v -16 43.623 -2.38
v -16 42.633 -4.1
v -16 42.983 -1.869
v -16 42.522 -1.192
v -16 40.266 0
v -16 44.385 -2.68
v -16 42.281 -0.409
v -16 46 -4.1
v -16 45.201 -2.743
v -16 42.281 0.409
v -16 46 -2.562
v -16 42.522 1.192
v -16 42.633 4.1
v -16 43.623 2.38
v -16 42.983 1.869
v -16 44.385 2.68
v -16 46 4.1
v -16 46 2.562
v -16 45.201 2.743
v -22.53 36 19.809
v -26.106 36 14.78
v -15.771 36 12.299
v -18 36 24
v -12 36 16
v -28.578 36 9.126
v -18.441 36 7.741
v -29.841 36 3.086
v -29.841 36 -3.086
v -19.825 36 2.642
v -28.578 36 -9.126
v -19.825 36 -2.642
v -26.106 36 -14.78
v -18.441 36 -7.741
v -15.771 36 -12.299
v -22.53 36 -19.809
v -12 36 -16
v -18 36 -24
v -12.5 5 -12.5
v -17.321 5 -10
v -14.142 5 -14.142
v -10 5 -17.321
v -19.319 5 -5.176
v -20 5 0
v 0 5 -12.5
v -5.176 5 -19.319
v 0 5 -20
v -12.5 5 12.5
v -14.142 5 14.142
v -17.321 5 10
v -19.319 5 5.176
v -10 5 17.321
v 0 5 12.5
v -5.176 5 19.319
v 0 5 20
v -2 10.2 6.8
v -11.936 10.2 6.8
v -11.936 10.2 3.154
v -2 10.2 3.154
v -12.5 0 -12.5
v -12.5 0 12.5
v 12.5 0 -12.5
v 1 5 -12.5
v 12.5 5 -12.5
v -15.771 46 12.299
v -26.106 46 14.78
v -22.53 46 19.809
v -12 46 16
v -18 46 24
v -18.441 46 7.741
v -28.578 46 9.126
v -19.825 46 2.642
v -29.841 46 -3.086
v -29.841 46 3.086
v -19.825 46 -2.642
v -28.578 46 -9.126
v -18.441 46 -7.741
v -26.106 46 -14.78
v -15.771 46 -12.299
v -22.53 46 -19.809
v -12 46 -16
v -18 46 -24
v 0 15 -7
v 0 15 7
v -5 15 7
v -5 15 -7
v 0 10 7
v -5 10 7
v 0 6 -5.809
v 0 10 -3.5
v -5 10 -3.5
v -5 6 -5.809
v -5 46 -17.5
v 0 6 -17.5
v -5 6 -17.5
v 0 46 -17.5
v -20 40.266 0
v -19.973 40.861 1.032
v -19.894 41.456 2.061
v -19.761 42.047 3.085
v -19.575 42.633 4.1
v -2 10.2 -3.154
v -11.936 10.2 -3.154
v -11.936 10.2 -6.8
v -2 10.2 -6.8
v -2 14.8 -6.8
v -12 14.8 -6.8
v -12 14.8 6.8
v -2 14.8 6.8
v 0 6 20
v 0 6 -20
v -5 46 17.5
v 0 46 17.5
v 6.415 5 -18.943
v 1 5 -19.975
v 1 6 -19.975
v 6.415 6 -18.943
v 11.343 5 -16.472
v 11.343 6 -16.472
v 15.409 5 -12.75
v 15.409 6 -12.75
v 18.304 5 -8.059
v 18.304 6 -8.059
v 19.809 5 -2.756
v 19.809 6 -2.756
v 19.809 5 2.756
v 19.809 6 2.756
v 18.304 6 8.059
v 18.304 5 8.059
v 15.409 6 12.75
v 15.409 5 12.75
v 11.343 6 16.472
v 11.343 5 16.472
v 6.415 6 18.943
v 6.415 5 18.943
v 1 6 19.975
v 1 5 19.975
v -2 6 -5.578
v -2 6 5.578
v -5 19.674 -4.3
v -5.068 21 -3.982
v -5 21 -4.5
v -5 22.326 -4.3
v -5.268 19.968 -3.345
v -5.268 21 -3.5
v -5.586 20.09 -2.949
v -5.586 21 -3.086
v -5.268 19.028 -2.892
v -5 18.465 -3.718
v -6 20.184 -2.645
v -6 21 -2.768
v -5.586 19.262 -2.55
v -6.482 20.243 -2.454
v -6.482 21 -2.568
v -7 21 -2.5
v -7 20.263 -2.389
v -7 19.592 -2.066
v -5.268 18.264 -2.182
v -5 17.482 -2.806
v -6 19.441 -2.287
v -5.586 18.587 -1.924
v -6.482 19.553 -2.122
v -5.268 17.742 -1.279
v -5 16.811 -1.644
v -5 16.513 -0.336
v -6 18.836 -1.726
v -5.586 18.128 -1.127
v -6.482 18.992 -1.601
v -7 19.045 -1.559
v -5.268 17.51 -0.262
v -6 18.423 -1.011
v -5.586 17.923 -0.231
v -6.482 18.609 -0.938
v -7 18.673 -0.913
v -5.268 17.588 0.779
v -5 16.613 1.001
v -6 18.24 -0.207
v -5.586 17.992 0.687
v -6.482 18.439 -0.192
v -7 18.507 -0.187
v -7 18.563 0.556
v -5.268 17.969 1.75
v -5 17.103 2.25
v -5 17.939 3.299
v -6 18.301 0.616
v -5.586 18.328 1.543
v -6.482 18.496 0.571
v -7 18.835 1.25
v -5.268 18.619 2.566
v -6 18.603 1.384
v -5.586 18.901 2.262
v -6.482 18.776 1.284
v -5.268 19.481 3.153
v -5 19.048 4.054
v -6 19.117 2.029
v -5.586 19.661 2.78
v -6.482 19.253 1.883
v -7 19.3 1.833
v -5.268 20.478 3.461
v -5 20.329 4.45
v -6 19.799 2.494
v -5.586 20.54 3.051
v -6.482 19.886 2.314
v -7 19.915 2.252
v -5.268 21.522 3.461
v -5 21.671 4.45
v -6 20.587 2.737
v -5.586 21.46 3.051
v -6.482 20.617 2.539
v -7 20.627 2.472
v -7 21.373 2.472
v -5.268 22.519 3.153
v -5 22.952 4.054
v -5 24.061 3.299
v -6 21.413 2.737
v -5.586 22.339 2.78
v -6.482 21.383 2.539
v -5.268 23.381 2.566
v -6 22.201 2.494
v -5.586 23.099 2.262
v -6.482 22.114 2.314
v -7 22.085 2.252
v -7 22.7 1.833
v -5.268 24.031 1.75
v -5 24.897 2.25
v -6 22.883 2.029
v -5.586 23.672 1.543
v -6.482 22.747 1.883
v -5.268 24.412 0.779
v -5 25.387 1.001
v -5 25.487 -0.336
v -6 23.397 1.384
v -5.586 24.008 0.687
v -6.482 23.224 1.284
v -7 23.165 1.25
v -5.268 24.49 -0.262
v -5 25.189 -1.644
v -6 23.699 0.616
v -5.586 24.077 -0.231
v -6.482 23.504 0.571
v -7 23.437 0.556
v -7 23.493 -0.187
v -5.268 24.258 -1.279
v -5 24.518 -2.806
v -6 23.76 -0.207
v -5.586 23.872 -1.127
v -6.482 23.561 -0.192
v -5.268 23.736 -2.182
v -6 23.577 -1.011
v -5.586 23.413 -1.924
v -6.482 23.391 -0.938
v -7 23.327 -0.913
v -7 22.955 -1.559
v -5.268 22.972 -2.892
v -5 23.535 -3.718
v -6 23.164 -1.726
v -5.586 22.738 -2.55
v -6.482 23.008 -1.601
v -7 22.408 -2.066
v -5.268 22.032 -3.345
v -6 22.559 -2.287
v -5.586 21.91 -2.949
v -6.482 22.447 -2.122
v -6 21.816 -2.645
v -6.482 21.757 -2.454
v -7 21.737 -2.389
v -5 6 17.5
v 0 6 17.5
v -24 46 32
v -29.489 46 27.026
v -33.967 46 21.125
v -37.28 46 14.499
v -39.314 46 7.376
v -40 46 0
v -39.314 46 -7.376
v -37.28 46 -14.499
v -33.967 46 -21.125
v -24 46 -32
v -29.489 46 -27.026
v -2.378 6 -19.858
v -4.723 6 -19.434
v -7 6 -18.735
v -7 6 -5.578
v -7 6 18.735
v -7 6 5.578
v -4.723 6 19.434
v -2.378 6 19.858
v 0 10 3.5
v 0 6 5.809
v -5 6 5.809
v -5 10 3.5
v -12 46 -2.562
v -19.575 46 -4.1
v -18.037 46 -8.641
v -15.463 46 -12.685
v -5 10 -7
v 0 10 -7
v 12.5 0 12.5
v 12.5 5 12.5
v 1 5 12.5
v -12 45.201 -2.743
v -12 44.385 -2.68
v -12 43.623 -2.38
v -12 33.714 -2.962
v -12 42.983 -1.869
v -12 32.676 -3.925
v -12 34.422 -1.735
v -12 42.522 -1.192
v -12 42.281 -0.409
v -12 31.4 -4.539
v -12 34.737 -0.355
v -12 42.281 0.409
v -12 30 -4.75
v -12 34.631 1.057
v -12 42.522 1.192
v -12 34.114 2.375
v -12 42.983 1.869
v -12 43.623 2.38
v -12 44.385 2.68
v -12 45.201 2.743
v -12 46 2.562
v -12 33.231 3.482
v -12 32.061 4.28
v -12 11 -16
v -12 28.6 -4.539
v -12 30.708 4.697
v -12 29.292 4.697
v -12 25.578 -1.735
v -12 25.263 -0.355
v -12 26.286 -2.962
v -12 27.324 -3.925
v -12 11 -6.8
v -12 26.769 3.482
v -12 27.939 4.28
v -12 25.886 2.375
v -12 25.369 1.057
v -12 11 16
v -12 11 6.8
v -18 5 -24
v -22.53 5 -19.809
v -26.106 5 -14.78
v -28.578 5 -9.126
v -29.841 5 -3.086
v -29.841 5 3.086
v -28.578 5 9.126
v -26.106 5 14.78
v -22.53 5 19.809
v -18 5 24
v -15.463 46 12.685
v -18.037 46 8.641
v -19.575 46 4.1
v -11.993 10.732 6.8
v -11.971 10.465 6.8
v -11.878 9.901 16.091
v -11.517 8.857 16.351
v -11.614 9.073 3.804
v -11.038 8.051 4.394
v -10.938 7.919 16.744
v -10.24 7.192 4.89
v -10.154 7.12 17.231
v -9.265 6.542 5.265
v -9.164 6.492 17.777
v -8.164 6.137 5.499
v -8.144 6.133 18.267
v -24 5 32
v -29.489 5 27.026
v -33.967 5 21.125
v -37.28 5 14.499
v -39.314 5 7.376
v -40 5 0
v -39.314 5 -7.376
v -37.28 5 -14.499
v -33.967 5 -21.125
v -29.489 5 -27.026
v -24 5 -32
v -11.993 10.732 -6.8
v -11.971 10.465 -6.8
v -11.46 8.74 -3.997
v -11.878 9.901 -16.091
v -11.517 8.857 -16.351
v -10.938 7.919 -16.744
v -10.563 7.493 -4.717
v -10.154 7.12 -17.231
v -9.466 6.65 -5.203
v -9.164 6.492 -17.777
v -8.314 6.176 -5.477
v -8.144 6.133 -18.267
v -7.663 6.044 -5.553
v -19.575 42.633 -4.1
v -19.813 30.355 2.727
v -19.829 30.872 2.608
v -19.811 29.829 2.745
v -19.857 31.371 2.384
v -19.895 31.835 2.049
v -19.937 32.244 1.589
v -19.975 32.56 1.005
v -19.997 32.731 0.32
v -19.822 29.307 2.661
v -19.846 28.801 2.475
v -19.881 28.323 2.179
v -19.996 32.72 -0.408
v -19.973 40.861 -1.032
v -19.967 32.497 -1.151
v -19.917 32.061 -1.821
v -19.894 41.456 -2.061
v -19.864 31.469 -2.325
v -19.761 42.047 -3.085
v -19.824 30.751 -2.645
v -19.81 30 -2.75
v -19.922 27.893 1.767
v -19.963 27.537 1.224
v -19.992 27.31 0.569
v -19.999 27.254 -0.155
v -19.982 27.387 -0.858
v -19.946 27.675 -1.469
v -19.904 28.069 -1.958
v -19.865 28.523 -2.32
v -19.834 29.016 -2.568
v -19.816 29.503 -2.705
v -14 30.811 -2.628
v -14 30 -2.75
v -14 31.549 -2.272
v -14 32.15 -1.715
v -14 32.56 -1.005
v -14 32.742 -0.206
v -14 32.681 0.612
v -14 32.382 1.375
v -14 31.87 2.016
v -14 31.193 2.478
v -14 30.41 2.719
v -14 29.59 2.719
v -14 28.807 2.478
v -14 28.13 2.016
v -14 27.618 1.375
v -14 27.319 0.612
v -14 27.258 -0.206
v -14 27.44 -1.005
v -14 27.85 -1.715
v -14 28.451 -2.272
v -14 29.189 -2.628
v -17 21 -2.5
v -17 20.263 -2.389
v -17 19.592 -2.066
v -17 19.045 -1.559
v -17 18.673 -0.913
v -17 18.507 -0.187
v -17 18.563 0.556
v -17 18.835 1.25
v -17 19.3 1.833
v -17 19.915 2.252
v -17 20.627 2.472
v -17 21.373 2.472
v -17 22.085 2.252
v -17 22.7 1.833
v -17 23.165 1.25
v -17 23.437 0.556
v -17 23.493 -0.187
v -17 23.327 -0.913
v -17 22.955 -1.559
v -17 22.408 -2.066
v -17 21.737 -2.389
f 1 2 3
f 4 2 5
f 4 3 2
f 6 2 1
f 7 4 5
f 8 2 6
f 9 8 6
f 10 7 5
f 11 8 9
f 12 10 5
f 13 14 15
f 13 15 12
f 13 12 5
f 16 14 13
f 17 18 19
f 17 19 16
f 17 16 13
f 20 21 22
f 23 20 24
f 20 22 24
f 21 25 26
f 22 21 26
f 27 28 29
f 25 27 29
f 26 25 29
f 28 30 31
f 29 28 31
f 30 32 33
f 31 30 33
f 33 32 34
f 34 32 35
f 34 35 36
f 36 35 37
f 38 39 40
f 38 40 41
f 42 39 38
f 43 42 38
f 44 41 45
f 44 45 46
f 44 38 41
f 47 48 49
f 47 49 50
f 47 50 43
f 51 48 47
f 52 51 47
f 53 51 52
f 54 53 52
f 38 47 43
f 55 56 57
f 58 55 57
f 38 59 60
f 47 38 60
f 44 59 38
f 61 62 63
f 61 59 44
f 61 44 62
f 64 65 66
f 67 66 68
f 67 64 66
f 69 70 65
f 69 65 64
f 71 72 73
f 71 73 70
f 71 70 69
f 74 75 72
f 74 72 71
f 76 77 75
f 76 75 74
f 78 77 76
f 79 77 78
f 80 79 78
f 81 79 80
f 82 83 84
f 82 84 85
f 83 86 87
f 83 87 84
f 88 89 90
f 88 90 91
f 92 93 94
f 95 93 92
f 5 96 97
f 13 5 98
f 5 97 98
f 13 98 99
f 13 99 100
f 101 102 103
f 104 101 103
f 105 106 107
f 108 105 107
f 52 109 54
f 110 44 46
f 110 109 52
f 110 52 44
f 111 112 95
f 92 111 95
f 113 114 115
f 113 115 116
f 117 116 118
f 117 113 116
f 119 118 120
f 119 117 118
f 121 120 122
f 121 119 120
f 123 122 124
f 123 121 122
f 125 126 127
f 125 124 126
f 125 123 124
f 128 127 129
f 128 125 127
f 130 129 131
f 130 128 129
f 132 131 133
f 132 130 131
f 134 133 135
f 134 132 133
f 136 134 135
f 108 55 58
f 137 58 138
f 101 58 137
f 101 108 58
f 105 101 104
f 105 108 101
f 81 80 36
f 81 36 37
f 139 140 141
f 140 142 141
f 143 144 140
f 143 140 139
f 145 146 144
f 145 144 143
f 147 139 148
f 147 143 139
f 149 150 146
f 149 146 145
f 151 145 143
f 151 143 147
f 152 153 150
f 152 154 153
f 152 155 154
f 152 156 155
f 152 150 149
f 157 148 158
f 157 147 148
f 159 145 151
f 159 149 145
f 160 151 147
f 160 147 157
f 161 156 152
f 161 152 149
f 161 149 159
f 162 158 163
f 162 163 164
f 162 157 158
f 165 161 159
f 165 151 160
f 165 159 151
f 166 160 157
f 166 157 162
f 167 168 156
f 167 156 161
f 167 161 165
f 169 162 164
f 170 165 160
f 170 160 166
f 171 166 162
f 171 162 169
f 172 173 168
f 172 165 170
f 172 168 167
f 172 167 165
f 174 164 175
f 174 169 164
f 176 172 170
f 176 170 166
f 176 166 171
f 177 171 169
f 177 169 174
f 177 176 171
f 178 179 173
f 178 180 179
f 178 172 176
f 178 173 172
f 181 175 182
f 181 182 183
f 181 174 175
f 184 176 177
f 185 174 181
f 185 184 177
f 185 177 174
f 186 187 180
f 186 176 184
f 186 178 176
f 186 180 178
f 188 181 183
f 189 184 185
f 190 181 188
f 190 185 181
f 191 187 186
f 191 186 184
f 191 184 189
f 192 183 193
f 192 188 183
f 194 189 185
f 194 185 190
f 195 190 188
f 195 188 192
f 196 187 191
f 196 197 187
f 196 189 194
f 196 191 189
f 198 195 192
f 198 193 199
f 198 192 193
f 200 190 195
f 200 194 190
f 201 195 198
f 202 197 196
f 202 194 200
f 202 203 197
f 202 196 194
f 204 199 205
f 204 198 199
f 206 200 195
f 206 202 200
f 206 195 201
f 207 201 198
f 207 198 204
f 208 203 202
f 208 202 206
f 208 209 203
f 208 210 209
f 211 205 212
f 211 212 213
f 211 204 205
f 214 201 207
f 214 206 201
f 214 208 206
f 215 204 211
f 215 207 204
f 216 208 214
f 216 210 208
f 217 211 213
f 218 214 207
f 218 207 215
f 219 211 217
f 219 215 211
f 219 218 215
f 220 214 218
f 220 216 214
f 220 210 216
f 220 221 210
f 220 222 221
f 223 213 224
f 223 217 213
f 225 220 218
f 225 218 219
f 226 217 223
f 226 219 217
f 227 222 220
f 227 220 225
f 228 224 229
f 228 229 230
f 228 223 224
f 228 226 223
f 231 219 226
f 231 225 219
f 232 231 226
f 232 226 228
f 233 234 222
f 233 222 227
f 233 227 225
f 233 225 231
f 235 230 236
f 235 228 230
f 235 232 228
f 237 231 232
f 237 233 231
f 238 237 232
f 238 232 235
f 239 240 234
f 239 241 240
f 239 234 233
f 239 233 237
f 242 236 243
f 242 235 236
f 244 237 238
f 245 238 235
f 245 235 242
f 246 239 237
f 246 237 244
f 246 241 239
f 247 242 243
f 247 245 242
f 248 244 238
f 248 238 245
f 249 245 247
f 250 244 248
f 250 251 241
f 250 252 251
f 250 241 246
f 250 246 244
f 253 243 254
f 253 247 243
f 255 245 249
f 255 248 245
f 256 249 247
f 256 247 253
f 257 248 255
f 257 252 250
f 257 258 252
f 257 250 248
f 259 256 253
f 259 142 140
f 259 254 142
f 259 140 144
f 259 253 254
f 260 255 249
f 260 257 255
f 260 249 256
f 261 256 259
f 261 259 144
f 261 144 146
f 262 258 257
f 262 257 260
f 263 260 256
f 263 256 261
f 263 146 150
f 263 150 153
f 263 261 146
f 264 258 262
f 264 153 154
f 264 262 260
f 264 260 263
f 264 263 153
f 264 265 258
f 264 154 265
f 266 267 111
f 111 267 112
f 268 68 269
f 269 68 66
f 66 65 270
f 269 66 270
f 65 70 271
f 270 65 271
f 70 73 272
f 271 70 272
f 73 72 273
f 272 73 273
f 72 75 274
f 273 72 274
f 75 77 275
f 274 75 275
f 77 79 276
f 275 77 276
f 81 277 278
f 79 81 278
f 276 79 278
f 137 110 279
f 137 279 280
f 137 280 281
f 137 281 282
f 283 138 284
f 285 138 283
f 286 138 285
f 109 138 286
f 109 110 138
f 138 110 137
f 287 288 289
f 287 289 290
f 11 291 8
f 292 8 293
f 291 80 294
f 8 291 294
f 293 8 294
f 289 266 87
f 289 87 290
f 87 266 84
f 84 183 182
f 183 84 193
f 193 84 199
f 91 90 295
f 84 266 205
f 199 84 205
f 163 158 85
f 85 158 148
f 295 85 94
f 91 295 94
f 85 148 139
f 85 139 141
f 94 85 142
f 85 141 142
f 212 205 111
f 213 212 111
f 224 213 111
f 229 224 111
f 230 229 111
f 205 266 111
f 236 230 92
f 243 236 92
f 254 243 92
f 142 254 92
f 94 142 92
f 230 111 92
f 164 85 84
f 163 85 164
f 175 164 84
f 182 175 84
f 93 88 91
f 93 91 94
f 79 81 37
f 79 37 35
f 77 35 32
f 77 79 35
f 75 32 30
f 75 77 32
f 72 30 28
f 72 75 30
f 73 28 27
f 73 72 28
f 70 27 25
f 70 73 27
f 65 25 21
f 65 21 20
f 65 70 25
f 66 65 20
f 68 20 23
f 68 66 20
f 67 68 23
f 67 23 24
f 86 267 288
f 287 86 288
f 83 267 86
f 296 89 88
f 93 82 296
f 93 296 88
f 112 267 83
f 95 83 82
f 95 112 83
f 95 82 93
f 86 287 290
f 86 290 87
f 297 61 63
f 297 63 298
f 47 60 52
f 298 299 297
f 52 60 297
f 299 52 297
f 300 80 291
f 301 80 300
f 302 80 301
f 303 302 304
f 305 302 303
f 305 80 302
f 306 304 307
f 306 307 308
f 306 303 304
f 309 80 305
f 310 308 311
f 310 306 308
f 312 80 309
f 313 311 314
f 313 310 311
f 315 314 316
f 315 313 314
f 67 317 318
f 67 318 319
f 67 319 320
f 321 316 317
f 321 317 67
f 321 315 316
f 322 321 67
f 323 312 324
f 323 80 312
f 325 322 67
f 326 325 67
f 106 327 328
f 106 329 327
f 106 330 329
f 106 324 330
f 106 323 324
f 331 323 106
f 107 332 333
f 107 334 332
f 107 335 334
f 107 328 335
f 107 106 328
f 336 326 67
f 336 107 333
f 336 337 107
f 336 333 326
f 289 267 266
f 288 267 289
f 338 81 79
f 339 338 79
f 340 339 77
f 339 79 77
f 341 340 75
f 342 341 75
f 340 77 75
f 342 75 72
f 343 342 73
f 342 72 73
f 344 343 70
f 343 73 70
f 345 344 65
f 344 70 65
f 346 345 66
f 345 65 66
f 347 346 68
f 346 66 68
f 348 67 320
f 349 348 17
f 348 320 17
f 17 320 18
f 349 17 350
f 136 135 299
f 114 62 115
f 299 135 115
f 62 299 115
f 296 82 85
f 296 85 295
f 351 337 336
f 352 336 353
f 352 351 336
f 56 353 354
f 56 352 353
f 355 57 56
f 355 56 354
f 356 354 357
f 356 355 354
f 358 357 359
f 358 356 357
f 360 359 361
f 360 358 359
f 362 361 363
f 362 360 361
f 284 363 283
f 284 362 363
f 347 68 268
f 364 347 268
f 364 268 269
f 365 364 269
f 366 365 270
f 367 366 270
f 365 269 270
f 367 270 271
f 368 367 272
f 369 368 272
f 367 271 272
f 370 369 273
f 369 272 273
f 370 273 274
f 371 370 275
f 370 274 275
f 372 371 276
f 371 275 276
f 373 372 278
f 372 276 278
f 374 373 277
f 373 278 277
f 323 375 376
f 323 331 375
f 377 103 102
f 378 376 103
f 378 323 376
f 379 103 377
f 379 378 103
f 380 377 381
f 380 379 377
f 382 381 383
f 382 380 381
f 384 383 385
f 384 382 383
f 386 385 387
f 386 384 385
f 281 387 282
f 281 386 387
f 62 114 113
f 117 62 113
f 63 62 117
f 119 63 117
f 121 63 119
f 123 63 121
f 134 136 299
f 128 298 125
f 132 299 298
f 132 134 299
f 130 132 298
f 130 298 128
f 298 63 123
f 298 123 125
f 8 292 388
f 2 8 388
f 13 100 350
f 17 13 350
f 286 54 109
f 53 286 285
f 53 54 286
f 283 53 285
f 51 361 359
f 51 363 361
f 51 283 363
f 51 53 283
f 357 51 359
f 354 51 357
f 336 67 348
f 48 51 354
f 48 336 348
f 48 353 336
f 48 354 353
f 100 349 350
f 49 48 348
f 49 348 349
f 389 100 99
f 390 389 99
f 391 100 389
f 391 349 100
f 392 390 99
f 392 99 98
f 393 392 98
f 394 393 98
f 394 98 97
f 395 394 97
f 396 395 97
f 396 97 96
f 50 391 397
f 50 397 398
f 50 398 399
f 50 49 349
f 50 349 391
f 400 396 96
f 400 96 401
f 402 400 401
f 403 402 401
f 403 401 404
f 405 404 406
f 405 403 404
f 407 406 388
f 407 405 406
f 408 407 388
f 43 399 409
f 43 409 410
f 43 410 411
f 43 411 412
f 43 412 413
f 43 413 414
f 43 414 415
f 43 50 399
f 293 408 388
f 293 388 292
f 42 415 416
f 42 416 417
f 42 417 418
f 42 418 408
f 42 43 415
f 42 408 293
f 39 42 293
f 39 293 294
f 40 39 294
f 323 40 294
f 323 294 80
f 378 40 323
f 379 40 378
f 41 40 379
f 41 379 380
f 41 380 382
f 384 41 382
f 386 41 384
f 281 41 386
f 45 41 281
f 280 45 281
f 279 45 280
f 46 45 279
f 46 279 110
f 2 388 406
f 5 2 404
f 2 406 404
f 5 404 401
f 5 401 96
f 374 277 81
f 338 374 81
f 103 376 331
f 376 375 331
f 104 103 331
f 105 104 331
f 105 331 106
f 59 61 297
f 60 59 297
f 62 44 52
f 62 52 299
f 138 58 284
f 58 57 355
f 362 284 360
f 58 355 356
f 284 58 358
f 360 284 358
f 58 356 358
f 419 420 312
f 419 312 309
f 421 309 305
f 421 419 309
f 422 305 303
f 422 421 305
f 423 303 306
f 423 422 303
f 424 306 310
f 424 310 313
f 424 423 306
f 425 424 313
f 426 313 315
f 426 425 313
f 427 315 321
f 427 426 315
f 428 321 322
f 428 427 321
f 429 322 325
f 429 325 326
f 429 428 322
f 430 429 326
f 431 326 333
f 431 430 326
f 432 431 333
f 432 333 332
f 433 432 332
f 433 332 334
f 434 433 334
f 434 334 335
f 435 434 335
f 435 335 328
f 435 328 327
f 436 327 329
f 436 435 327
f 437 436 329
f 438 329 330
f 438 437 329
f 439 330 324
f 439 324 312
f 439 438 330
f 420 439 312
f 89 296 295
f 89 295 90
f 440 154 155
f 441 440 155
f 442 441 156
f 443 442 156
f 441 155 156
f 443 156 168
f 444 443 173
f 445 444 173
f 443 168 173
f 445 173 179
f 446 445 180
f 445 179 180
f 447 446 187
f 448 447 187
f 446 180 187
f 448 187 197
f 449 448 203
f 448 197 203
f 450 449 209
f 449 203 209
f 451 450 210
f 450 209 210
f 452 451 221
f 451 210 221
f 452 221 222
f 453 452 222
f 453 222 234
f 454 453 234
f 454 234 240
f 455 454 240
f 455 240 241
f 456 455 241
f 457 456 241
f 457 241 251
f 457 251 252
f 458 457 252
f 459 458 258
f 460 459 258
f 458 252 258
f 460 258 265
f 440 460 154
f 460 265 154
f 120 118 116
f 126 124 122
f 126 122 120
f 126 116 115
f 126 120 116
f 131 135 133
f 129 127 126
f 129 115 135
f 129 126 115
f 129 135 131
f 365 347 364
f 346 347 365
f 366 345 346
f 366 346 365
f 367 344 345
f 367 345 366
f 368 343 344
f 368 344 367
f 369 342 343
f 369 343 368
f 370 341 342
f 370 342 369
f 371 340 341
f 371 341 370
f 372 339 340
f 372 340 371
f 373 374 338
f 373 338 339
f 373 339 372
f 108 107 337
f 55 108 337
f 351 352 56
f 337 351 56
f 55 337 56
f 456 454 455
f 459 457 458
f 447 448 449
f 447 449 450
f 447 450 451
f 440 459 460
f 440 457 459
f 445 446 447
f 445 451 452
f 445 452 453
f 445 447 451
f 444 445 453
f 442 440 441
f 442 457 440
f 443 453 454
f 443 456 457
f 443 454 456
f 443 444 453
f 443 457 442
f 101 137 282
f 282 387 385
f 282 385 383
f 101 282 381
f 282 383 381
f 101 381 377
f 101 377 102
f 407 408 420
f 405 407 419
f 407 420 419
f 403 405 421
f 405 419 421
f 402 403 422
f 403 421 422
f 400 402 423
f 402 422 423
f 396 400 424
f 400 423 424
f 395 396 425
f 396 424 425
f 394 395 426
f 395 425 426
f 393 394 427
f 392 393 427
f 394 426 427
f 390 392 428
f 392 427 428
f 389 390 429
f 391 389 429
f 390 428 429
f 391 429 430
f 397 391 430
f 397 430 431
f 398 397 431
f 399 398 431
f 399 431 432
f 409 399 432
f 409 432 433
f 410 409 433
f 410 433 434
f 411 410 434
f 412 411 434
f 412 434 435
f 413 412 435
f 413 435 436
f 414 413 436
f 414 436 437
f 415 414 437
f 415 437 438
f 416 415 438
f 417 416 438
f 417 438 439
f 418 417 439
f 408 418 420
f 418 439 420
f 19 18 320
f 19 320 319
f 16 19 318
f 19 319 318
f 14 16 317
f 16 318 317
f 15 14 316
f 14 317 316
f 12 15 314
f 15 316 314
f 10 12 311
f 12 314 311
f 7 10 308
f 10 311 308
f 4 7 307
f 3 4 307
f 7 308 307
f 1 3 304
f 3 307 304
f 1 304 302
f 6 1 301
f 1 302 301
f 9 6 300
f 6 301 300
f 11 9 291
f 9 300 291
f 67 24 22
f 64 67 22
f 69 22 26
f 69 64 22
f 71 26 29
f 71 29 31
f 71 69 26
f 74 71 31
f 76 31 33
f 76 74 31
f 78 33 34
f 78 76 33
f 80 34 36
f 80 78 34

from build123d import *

# Parameters (mm, degrees)
SCHIZZO1_R                       = 20
ESTRUSIONE_ESTRUSIONE1_DEPTH     = 6
ESTRUSIONE_ESTRUSIONE2_DEPTH     = 40
RACCORDO1_R                      = 5
FORO_PER_VITE_M5_1_D             = 5.5
FORO_PER_VITE_M5_1_DEPTH         = 14
FORO_PER_VITE_M5_1_TIP           = 1.652366702
TAGLIO_ESTRUSIONE1_DEPTH         = 4
SCHIZZO9_W                       = 35
SCHIZZO9_H                       = 40
ESTRUSIONE_ESTRUSIONE3_DEPTH     = 5
SCHIZZO10_R                      = 2.5
ESTRUSIONE_ESTRUSIONE4_DEPTH     = 12
TAGLIO_ESTRUSIONE2_DEPTH         = 12
ESTRUSIONE_ESTRUSIONE5_DEPTH     = 10
SCHIZZO13_W                      = 1
SCHIZZO13_H                      = 40
TAGLIO_ESTRUSIONE_SOTTILE1_DEPTH = 1
SCHIZZO17_OUTSIDE_W              = 56.582
SCHIZZO17_OUTSIDE_H              = 56.582
SCHIZZO17_OUTSIDE_W_2            = 25
SCHIZZO17_OUTSIDE_H_2            = 25
TAGLIO_ESTRUSIONE3_DEPTH         = 5
RACCORDO2_R                      = 2
SMUSSO1_SIZE                     = 2
BOSS_EXTRUDE1_DEPTH              = 41
BOSS_EXTRUDE2_DEPTH              = 10


with BuildPart() as part:
    # Schizzo1 → Estrusione-Estrusione1 (new body)
    with BuildSketch(Plane(origin=(0, 0, 0), x_dir=(1, 0, 0), z_dir=(0, 1, 0))):
        with Locations(Location((0, 0, 0), (0, 0, 270))):
            Circle(SCHIZZO1_R)
    extrude(amount=ESTRUSIONE_ESTRUSIONE1_DEPTH)

    # Schizzo2 → Estrusione-Estrusione2 (add)
    with BuildSketch(Plane(origin=(0, 6, 0), x_dir=(1, 0, 0), z_dir=(0, 1, 0))):
        with BuildLine():
            Line((-12, 16), (-12, -16))
            ThreePointArc((-12, -16), (-20, 0), (-12, 16))
        make_face()
    extrude(amount=ESTRUSIONE_ESTRUSIONE2_DEPTH)

    # Raccordo1
    # the kernel refuses this fillet: 5 mm, written as the material it adds along each edge
    with BuildSketch(Plane(origin=(-12, 6, -28.5), x_dir=(1, 0, 0), z_dir=(0, 0, 1))) as raccordo1_piece_1_section:
        with BuildLine():
            CenterArc((RACCORDO1_R, RACCORDO1_R), RACCORDO1_R, 180, 90)
            Line((0, RACCORDO1_R), (0, 0))
            Line((0, 0), (RACCORDO1_R, 0))
        make_face()
    raccordo1_piece_1 = extrude(amount=57, mode=Mode.PRIVATE)
    raccordo1_piece_1 = raccordo1_piece_1 & Plane(origin=(0, 7.106421828, 0), x_dir=(0, 0, 1), z_dir=(0, -1, 0)) * Cylinder(20, 134, mode=Mode.PRIVATE)
    add(raccordo1_piece_1)

    # Foro per Vite M5-1
    with Locations(Plane.ZY.offset(20)):
        with Locations((0, 30), (0, 45)):
            Hole(FORO_PER_VITE_M5_1_D / 2, depth=FORO_PER_VITE_M5_1_DEPTH)
            with Locations((0, 0, -(FORO_PER_VITE_M5_1_DEPTH + FORO_PER_VITE_M5_1_TIP / 2))):  # 118° drill point
                Cone(0, FORO_PER_VITE_M5_1_D / 2, FORO_PER_VITE_M5_1_TIP, mode=Mode.SUBTRACT)

    # Schizzo8 → Taglio-Estrusione1 (cut)
    with BuildSketch(Plane.ZY.offset(20)):
        Polygon((0, 49.734272207), (-4.1, 47.367136104), (-4.1, 42.632863896), (0, 40.265727793), (4.1, 42.632863896), (4.1, 47.367136104), align=None)
    extrude(amount=-TAGLIO_ESTRUSIONE1_DEPTH, mode=Mode.SUBTRACT)

    # Schizzo12 → Estrusione-Estrusione5 (add)
    with BuildSketch(Plane(origin=(-12, 0, 0), x_dir=(0, 0, -1), z_dir=(1, 0, 0))):
        Polygon((5.578460969, 6), (3.153589838, 10.2), (6.8, 10.2), (6.8, 14.8), (-6.8, 14.8), (-6.8, 10.2), (-3.153589838, 10.2), (-5.578460969, 6), align=None)
    extrude(amount=ESTRUSIONE_ESTRUSIONE5_DEPTH)

    # Schizzo13 → Taglio-Estrusione-Sottile1 (cut)
    with BuildSketch(Plane(origin=(0, 6, 0), x_dir=(1, 0, 0), z_dir=(0, 1, 0))):
        with Locations((0.5, 0)):
            Rectangle(SCHIZZO13_W, SCHIZZO13_H)
    extrude(amount=-TAGLIO_ESTRUSIONE_SOTTILE1_DEPTH, mode=Mode.SUBTRACT)

    # Schizzo17 outside → Taglio-Estrusione3 (cut)
    with BuildSketch(Plane.XZ):
        Rectangle(SCHIZZO17_OUTSIDE_W, SCHIZZO17_OUTSIDE_H)
        Rectangle(SCHIZZO17_OUTSIDE_W_2, SCHIZZO17_OUTSIDE_H_2, mode=Mode.SUBTRACT)
    extrude(amount=-TAGLIO_ESTRUSIONE3_DEPTH, mode=Mode.SUBTRACT)

    # Smusso1
    smusso1_edges = [part.edges().sort_by_distance(p)[0] for p in [
        (-12, 30, 2.75),
    ]]
    chamfer(smusso1_edges, length=SMUSSO1_SIZE)


with BuildPart() as body_2:
    # Schizzo9 → Estrusione-Estrusione3 (new body)
    with BuildSketch(Plane(origin=(0, 0, 0), x_dir=(0, 0, -1), z_dir=(1, 0, 0))):
        with Locations((0, 26)):
            Rectangle(SCHIZZO9_W, SCHIZZO9_H)
    extrude(amount=-ESTRUSIONE_ESTRUSIONE3_DEPTH)

    # Schizzo10 → Estrusione-Estrusione4 (add)
    with BuildSketch(Plane.ZY.offset(5)):
        with Locations(Location((0, 21, 0), (0, 0, 180))):
            Circle(SCHIZZO10_R)
    extrude(amount=ESTRUSIONE_ESTRUSIONE4_DEPTH)

    # Schizzo11 → Taglio-Estrusione2 (cut)
    with BuildSketch(Plane(origin=(0, 0, 0), x_dir=(0, 0, -1), z_dir=(1, 0, 0))):
        Polygon((-5.809401077, 6), (-3.5, 10), (-7, 10), (-7, 15), (7, 15), (7, 10), (3.5, 10), (5.809401077, 6), align=None)
    extrude(amount=-TAGLIO_ESTRUSIONE2_DEPTH, mode=Mode.SUBTRACT)

    # Raccordo2
    raccordo2_edges = [body_2.edges().sort_by_distance(p)[0] for p in [
        (-5, 21, 2.5),
    ]]
    fillet(raccordo2_edges, radius=RACCORDO2_R)


with BuildPart() as body_3:
    # Sketch1 → Boss-Extrude1 (new body)
    with BuildSketch(Plane(origin=(0, 46, 0), x_dir=(1, 0, 0), z_dir=(0, 1, 0))):
        with BuildLine():
            Line((-24, 32), (-18, 24))
            ThreePointArc((-18, 24), (-30, 0), (-18, -24))
            Line((-18, -24), (-24, -32))
            ThreePointArc((-24, -32), (-40, 0), (-24, 32))
        make_face()
    extrude(amount=-BOSS_EXTRUDE1_DEPTH)


with BuildPart() as body_4:
    # Sketch2 → Boss-Extrude2 (new body)
    with BuildSketch(Plane(origin=(0, 46, 0), x_dir=(1, 0, 0), z_dir=(0, 1, 0))):
        with BuildLine():
            Line((-12, 16), (-18, 24))
            ThreePointArc((-18, 24), (-30, 0), (-18, -24))
            Line((-18, -24), (-12, -16))
            ThreePointArc((-12, -16), (-20, 0), (-12, 16))
        make_face()
    extrude(amount=-BOSS_EXTRUDE2_DEPTH)


solid = Compound([part.part, body_2.part, body_3.part, body_4.part])
